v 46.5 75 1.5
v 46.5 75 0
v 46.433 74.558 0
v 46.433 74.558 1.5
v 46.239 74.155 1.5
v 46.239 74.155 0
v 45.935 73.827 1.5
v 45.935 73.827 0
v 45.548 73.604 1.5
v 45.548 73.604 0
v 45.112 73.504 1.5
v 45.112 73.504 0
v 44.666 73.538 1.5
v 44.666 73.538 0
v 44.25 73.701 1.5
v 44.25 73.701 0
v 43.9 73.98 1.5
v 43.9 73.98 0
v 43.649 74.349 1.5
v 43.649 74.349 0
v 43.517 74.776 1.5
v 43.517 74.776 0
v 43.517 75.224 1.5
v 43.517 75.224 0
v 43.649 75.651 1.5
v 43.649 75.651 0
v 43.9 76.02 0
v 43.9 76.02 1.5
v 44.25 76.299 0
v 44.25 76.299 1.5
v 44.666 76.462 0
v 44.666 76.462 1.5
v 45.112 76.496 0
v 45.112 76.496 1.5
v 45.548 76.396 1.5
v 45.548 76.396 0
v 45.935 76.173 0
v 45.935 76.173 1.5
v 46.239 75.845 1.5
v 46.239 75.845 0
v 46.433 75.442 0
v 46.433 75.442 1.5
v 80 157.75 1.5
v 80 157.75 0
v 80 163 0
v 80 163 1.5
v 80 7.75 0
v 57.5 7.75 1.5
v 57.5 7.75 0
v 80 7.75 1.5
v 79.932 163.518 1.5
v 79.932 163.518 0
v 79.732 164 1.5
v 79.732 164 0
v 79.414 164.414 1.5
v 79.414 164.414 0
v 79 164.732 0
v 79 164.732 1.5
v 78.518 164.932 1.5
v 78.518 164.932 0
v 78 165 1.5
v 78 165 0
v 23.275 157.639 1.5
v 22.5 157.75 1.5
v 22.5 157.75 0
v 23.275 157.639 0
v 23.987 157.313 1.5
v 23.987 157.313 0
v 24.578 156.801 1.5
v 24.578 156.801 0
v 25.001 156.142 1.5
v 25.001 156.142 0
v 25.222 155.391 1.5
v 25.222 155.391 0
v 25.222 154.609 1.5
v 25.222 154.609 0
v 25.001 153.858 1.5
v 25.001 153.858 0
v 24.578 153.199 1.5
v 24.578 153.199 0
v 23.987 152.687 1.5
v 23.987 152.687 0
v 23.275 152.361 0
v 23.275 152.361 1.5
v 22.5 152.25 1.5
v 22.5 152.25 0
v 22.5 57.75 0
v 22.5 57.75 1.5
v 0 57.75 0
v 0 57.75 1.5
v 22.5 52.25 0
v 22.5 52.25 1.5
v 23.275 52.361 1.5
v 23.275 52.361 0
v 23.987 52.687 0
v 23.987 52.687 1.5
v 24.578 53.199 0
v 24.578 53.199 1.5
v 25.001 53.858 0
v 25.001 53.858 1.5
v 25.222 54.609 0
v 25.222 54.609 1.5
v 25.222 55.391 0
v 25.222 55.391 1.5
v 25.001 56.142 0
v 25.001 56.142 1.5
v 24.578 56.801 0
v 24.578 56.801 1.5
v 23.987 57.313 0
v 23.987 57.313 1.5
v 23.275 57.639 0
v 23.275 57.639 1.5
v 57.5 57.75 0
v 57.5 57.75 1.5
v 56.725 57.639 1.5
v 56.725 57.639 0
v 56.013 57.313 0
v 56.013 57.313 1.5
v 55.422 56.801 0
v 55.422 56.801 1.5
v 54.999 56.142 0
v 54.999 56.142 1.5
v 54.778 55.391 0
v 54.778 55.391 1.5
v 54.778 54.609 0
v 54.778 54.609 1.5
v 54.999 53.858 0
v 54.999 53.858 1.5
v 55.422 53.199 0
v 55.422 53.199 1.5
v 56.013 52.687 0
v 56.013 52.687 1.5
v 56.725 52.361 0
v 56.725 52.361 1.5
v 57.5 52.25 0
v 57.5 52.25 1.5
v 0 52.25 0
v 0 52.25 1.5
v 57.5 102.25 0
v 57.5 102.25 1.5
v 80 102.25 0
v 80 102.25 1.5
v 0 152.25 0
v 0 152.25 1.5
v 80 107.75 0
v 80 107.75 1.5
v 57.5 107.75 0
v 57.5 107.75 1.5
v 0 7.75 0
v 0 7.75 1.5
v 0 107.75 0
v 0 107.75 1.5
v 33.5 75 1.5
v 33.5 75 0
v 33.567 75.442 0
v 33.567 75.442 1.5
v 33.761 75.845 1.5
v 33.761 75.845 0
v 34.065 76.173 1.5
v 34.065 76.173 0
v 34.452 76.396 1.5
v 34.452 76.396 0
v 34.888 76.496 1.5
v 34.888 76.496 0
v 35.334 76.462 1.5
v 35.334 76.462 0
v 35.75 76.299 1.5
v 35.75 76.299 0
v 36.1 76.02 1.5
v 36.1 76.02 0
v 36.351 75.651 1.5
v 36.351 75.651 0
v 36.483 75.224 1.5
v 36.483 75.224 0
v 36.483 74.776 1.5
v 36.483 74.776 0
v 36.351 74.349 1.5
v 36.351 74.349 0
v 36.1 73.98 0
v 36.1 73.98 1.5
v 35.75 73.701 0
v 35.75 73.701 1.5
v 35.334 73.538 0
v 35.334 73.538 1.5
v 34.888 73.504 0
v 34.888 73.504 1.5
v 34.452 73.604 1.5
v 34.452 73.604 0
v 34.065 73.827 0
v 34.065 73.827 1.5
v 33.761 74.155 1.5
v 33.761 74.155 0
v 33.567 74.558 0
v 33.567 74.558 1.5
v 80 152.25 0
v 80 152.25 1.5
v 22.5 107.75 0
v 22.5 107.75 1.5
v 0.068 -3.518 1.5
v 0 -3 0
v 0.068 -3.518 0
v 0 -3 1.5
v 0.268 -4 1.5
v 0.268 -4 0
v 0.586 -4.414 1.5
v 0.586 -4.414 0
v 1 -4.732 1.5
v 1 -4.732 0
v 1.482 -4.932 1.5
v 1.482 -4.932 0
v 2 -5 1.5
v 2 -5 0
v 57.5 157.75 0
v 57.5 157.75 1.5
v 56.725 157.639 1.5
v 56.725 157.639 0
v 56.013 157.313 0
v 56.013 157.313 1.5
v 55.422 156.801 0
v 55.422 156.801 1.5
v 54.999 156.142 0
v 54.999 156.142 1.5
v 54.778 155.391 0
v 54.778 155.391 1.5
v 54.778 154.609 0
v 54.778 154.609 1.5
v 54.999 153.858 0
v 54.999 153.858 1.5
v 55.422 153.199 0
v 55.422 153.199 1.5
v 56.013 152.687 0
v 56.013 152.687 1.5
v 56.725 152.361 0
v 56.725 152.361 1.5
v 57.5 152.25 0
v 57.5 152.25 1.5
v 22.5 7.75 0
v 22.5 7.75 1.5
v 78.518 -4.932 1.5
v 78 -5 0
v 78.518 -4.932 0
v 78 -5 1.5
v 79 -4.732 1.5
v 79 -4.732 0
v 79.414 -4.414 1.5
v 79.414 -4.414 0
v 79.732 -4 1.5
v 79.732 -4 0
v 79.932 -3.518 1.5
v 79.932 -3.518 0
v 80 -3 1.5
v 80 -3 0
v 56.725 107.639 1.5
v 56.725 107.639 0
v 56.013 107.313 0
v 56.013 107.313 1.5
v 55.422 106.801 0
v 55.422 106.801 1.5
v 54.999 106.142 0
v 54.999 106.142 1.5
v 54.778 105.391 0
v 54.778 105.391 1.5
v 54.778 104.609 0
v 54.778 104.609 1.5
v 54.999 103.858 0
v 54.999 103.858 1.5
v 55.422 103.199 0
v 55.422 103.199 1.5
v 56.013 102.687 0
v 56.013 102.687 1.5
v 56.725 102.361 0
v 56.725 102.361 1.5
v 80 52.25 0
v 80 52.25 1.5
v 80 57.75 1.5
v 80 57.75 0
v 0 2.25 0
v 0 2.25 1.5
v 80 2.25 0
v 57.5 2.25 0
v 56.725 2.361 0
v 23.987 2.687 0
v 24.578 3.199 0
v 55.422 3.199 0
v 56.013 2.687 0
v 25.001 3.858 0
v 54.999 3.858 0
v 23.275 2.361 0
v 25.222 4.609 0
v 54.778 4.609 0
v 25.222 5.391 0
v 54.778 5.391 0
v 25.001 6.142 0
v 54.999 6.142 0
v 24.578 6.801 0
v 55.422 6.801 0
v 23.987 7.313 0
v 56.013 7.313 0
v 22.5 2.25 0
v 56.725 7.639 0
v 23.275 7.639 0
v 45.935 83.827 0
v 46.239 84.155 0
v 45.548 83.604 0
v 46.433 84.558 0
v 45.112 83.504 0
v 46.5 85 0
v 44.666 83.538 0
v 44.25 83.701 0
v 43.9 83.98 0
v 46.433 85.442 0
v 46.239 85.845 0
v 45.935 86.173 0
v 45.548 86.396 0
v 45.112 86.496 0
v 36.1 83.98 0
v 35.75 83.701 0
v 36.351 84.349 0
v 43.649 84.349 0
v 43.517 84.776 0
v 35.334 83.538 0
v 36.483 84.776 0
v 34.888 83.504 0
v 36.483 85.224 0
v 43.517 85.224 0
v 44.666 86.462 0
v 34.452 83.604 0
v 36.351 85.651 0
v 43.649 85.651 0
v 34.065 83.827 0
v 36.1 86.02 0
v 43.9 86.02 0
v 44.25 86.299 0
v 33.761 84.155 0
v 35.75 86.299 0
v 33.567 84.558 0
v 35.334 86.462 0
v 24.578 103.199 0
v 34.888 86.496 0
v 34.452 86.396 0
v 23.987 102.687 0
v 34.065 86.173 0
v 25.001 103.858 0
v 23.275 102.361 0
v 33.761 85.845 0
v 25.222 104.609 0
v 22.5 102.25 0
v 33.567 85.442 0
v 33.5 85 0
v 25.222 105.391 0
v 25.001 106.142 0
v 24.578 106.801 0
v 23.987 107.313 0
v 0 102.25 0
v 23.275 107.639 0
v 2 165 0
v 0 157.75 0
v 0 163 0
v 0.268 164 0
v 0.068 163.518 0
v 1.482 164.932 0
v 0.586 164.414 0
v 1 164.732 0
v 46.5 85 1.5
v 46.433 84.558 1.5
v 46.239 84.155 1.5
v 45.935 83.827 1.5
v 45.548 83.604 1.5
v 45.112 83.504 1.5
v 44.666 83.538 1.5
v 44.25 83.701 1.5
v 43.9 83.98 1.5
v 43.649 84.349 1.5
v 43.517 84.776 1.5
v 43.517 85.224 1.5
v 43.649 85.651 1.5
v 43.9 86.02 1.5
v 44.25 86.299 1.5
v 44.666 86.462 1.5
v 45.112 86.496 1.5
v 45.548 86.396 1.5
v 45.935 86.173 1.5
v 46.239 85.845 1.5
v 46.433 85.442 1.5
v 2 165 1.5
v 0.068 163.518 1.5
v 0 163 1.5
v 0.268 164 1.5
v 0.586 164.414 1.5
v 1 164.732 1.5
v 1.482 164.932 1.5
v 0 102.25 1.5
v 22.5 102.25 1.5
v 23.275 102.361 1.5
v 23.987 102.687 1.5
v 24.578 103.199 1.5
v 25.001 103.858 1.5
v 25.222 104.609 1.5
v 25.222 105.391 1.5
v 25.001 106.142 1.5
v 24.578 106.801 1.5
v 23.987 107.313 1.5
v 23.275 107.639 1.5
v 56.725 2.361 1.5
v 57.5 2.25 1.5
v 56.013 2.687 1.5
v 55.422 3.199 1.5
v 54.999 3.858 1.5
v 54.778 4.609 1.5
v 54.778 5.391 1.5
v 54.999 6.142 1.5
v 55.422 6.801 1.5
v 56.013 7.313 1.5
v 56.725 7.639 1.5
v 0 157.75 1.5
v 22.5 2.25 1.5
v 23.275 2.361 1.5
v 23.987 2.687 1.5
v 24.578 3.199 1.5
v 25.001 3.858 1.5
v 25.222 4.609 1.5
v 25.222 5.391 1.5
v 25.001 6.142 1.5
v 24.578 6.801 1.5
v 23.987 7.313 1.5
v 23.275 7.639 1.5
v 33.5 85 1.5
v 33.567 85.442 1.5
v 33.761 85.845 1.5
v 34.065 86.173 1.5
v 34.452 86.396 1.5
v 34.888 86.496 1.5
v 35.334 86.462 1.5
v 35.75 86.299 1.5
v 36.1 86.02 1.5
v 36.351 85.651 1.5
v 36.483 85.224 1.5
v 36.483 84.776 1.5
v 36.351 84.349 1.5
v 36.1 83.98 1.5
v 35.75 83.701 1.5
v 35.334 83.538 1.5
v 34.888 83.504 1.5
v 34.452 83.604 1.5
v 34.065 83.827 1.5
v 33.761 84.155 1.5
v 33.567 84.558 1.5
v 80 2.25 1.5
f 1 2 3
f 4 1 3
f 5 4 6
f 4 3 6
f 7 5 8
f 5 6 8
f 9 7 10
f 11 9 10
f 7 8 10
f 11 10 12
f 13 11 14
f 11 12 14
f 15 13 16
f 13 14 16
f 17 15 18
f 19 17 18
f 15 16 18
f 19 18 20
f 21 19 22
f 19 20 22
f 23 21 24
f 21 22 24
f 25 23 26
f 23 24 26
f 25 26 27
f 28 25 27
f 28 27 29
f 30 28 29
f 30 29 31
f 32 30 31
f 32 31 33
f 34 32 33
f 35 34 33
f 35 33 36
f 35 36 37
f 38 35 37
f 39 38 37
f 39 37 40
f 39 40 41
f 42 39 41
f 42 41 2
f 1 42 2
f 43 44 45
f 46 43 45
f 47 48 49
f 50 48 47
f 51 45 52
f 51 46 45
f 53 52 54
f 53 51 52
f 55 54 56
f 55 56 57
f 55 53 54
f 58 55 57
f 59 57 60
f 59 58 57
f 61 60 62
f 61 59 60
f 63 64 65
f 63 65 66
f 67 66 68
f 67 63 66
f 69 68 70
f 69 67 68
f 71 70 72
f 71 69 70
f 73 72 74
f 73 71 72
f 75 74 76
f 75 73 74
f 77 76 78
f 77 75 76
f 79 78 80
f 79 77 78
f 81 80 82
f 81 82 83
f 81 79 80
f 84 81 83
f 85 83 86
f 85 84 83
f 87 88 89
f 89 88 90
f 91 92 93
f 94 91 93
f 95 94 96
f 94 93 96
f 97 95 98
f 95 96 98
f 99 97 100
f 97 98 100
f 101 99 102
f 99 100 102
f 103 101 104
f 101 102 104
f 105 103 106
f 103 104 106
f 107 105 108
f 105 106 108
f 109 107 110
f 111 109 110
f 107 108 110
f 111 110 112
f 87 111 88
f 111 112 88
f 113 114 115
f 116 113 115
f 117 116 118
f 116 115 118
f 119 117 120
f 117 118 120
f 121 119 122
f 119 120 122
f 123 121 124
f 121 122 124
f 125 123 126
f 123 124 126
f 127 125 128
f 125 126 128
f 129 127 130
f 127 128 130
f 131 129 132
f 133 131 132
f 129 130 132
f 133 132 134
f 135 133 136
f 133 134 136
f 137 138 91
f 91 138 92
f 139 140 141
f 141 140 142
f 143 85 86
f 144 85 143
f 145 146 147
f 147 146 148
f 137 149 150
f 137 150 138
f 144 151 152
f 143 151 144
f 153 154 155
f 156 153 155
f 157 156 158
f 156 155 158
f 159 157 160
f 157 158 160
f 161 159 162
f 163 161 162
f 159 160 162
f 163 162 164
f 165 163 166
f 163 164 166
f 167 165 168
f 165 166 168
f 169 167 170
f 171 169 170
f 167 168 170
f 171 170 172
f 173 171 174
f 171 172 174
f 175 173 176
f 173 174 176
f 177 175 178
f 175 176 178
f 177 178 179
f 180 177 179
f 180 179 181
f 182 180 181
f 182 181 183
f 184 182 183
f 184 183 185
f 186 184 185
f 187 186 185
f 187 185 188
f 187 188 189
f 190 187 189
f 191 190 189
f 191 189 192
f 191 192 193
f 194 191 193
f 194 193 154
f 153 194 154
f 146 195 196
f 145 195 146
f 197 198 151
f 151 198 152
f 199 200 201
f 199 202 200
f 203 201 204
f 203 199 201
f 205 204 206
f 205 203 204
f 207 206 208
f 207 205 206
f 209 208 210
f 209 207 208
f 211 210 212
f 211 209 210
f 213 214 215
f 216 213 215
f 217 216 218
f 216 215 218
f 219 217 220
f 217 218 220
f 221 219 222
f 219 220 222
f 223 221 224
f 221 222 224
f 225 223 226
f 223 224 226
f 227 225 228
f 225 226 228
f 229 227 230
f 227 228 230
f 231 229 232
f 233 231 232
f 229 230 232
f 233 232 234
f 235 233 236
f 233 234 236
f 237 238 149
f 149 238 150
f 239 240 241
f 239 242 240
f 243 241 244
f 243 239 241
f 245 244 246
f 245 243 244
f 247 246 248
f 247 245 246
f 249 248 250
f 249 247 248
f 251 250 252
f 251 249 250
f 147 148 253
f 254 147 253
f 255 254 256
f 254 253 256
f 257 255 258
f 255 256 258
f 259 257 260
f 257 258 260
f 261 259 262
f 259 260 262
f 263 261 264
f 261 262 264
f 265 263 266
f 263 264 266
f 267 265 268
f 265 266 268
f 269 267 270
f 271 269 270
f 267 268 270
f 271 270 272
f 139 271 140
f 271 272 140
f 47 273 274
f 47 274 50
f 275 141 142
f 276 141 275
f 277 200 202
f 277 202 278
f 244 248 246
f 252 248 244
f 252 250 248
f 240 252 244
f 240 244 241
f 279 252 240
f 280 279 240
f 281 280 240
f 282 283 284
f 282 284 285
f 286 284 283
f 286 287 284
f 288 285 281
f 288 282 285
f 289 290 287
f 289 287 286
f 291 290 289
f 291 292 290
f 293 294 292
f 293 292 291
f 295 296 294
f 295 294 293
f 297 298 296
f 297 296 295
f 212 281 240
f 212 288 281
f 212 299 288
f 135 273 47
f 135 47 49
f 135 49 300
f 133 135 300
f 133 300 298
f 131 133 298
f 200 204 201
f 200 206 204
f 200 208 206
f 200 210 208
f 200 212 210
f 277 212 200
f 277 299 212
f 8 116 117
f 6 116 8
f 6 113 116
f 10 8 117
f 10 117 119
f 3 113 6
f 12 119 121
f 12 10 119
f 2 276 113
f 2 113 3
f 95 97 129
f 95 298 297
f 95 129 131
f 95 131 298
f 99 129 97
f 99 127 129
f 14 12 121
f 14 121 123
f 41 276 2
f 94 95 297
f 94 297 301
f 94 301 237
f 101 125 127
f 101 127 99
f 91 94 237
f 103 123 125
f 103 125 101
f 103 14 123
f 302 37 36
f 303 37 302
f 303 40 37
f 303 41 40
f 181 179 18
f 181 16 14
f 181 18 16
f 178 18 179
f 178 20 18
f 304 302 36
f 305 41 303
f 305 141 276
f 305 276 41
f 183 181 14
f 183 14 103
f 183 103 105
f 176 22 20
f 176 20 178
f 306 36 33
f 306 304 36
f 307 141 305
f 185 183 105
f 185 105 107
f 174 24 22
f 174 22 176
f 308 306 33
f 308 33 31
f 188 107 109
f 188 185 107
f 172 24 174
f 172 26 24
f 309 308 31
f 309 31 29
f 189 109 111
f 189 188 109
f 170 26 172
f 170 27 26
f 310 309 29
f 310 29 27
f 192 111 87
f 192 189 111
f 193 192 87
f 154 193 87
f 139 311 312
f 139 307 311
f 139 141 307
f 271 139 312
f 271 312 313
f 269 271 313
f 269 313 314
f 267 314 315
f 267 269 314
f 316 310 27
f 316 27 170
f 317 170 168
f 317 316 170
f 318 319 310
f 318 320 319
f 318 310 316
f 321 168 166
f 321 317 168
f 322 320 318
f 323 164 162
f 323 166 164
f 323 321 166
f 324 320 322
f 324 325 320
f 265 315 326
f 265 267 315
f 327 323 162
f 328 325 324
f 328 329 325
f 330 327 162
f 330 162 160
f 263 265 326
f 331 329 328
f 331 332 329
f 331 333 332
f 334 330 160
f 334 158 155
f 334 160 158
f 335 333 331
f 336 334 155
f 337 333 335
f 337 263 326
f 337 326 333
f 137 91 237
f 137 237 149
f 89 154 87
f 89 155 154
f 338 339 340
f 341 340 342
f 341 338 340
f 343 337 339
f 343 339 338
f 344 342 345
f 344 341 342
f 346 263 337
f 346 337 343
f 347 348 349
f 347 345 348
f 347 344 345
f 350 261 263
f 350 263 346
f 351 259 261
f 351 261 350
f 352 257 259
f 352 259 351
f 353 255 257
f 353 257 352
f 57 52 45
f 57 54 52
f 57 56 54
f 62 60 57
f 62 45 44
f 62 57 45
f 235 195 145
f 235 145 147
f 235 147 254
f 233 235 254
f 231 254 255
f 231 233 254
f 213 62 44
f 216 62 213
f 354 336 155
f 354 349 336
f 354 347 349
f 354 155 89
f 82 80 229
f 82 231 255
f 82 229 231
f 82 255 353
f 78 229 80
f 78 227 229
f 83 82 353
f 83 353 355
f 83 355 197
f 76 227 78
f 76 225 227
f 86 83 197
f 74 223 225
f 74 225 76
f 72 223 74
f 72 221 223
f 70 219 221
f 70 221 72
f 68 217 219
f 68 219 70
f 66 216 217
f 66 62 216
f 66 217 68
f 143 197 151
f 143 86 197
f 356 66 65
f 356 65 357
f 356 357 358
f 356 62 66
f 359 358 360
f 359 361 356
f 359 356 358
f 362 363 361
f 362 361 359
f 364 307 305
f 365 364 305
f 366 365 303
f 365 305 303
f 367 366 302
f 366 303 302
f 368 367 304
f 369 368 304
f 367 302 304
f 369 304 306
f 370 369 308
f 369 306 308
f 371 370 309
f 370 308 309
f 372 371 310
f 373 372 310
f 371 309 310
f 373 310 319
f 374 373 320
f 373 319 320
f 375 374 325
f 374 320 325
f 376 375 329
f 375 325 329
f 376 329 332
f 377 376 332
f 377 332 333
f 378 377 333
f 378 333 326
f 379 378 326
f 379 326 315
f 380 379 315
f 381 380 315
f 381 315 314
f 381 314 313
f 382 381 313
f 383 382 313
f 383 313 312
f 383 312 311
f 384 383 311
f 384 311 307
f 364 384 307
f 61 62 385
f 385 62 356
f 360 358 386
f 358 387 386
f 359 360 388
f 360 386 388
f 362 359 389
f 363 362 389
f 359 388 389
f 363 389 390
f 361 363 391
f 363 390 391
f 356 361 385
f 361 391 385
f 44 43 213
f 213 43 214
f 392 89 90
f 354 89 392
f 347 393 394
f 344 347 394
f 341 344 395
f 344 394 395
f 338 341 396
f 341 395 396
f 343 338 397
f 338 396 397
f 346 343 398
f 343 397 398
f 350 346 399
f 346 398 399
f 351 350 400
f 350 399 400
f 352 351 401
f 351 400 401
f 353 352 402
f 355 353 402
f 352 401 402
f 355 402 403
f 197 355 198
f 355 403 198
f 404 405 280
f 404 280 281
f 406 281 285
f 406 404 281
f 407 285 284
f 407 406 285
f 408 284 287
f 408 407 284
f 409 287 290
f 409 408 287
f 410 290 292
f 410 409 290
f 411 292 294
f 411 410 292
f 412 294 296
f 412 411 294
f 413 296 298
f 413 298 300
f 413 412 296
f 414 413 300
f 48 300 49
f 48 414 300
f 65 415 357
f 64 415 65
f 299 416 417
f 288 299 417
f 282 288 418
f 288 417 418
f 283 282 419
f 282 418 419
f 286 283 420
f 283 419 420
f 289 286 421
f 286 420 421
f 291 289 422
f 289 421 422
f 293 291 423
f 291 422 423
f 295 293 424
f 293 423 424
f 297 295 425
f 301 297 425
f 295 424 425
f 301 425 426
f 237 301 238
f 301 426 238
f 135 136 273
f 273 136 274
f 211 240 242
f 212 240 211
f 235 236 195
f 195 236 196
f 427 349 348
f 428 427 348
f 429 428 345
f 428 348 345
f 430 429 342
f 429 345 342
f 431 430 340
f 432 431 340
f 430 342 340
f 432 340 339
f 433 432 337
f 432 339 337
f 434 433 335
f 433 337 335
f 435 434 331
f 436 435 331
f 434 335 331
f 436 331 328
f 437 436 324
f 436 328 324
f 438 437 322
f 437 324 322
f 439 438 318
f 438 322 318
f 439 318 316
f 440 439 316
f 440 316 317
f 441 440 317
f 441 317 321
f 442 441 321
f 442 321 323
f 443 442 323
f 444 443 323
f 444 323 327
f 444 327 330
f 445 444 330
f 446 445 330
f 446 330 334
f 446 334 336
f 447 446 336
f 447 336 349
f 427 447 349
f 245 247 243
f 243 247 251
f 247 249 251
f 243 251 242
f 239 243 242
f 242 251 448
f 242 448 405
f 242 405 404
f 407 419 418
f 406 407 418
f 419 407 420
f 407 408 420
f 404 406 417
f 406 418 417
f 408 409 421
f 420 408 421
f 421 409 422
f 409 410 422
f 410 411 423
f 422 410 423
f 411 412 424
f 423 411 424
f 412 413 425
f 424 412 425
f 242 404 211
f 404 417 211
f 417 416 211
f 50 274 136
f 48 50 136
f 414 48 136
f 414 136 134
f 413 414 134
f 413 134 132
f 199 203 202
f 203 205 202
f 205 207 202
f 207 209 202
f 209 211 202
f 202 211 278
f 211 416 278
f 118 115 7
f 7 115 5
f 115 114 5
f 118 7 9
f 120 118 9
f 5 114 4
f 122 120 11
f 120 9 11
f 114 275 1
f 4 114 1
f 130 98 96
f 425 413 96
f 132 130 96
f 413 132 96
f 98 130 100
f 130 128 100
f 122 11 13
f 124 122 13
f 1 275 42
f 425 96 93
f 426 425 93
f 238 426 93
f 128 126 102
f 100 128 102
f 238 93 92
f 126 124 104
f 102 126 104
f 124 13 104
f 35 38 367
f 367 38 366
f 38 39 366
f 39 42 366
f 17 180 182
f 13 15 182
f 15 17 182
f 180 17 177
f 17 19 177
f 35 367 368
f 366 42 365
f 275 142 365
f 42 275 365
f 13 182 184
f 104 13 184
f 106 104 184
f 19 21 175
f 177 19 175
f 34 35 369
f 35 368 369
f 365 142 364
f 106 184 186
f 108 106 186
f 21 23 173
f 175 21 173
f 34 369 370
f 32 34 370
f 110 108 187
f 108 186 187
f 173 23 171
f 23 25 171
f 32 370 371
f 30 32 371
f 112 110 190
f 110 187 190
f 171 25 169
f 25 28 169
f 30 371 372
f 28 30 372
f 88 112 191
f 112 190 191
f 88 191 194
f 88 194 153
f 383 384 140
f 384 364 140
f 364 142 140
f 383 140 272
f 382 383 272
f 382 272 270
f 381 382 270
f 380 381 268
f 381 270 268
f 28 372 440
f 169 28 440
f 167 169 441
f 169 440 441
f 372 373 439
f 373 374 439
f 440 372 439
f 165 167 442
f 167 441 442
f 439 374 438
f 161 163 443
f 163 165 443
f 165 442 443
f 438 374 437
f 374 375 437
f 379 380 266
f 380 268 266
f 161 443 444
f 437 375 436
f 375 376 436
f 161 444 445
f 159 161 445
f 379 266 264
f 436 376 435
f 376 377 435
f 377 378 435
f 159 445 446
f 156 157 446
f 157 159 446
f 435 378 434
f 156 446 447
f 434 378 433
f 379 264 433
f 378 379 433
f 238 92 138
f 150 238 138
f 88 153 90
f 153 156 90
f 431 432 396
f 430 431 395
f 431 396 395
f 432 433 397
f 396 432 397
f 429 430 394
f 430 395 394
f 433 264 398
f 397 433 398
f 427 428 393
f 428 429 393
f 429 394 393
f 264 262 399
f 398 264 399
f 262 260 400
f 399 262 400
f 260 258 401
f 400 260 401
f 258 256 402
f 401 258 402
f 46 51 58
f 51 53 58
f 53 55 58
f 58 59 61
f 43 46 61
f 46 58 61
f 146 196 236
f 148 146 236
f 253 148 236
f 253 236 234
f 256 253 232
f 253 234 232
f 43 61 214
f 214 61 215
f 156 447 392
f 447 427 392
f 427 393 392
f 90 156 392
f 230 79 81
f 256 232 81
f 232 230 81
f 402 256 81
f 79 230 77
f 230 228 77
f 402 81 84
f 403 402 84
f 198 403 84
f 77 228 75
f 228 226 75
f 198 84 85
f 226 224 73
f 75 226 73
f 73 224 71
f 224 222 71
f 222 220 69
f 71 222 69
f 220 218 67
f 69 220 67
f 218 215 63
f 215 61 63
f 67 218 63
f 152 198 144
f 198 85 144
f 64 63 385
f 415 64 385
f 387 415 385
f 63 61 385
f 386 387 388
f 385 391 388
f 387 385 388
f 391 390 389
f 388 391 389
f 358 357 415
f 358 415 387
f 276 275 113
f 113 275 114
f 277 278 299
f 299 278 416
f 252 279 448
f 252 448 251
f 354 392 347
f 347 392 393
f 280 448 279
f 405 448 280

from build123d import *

# Parameters (mm, degrees)
EXTRUDE_1_DEPTH      = 1.5
CUT_EXTRUDE_1_DEPTH  = 1.5
SKETCH_3_R           = 2
CUT_EXTRUDE_2_DEPTH  = 1.5
SKETCH_4_W           = 80
SKETCH_4_H           = 5
EXTRUDE_2_DEPTH      = 1.5
FILLET_1_R           = 2
SKETCH_5_OUTSIDE_W   = 163.618
SKETCH_5_OUTSIDE_H   = 213.618
SKETCH_5_OUTSIDE_W_2 = 80
SKETCH_5_OUTSIDE_H_2 = 170
CUT_EXTRUDE_3_DEPTH  = 193.943644622
SKETCH_6_R           = 1.5
CUT_EXTRUDE_4_DEPTH  = 184.377343202


with BuildPart() as part:
    # 草图1 → 凸台-拉伸1 (new body)
    with BuildSketch(Plane.XY):
        Polygon((80, 90), (100, 90), (100, 70), (80, 70), (80, 0), (0, 0), (0, 70), (-20, 70), (-20, 90), (0, 90), (0, 160), (80, 160), align=None)
    extrude(amount=EXTRUDE_1_DEPTH)

    # 草图2 → 切除-拉伸1 (cut)
    with BuildSketch(Plane.XY.offset(1.5)):
        with BuildLine():
            Line((57.5, 152.25), (80, 152.25))
            Line((80, 152.25), (80, 157.75))
            Line((80, 157.75), (57.5, 157.75))
            ThreePointArc((57.5, 157.75), (54.75, 155), (57.5, 152.25))
        make_face()
        with BuildLine():
            Line((22.5, 152.25), (0, 152.25))
            Line((0, 152.25), (0, 157.75))
            Line((0, 157.75), (22.5, 157.75))
            ThreePointArc((22.5, 157.75), (25.25, 155), (22.5, 152.25))
        make_face()
        with BuildLine():
            Line((57.5, 102.25), (80, 102.25))
            Line((80, 102.25), (80, 107.75))
            Line((80, 107.75), (57.5, 107.75))
            ThreePointArc((57.5, 107.75), (54.75, 105), (57.5, 102.25))
        make_face()
        with BuildLine():
            Line((22.5, 107.75), (0, 107.75))
            Line((0, 107.75), (0, 102.25))
            Line((0, 102.25), (22.5, 102.25))
            ThreePointArc((22.5, 102.25), (25.25, 105), (22.5, 107.75))
        make_face()
        with BuildLine():
            Line((22.5, 57.75), (0, 57.75))
            Line((0, 57.75), (0, 52.25))
            Line((0, 52.25), (22.5, 52.25))
            ThreePointArc((22.5, 52.25), (25.25, 55), (22.5, 57.75))
        make_face()
        with BuildLine():
            Line((57.5, 52.25), (80, 52.25))
            Line((80, 52.25), (80, 57.75))
            Line((80, 57.75), (57.5, 57.75))
            ThreePointArc((57.5, 57.75), (54.75, 55), (57.5, 52.25))
        make_face()
        with BuildLine():
            Line((22.5, 7.75), (0, 7.75))
            Line((0, 7.75), (0, 2.25))
            Line((0, 2.25), (22.5, 2.25))
            ThreePointArc((22.5, 2.25), (25.25, 5), (22.5, 7.75))
        make_face()
        with BuildLine():
            Line((57.5, 7.75), (80, 7.75))
            Line((80, 7.75), (80, 2.25))
            Line((80, 2.25), (57.5, 2.25))
            ThreePointArc((57.5, 2.25), (54.75, 5), (57.5, 7.75))
        make_face()
    extrude(amount=-CUT_EXTRUDE_1_DEPTH, mode=Mode.SUBTRACT)

    # 草图3 → 切除-拉伸2 (cut)
    with BuildSketch(Plane.XY.offset(1.5)):
        with Locations((90, 80)):
            Circle(SKETCH_3_R)
        with Locations((-10, 80)):
            Circle(SKETCH_3_R)
    extrude(amount=-CUT_EXTRUDE_2_DEPTH, mode=Mode.SUBTRACT)

    # 草图4 → 凸台-拉伸2 (add)
    with BuildSketch(Plane(origin=(0, 0, 0), x_dir=(-1, 0, 0), z_dir=(0, 0, -1))):
        with Locations((-40, 162.5)):
            Rectangle(SKETCH_4_W, SKETCH_4_H)
        with Locations((-40, -2.5)):
            Rectangle(SKETCH_4_W, SKETCH_4_H)
    extrude(amount=-EXTRUDE_2_DEPTH)

    # 圆角1
    fillet_1_edges = [part.edges().sort_by_distance(p)[0] for p in [
        (0, 165, 0.75),
        (80, 165, 0.75),
        (0, -5, 0.75),
        (80, -5, 0.75),
    ]]
    fillet(fillet_1_edges, radius=FILLET_1_R)

    # 草图5 outside → 切除-拉伸3 (cut, through all)
    with BuildSketch(Plane.XY.offset(1.5)):
        with Locations((40, 80)):
            Rectangle(SKETCH_5_OUTSIDE_W, SKETCH_5_OUTSIDE_H)
        with Locations((40, 80)):
            Rectangle(SKETCH_5_OUTSIDE_W_2, SKETCH_5_OUTSIDE_H_2, mode=Mode.SUBTRACT)
    extrude(amount=-CUT_EXTRUDE_3_DEPTH, mode=Mode.SUBTRACT)

    # 草图6 → 切除-拉伸4 (cut, through all)
    with BuildSketch(Plane(origin=(0, 0, 0), x_dir=(-1, 0, 0), z_dir=(0, 0, -1))):
        with Locations((-35, 85)):
            Circle(SKETCH_6_R)
        with Locations((-35, 75)):
            Circle(SKETCH_6_R)
        with Locations(Location((-45, 75, 0), (0, 0, 180))):
            Circle(SKETCH_6_R)
        with Locations(Location((-45, 85, 0), (0, 0, 180))):
            Circle(SKETCH_6_R)
    extrude(amount=-CUT_EXTRUDE_4_DEPTH, mode=Mode.SUBTRACT)


solid = part.part
